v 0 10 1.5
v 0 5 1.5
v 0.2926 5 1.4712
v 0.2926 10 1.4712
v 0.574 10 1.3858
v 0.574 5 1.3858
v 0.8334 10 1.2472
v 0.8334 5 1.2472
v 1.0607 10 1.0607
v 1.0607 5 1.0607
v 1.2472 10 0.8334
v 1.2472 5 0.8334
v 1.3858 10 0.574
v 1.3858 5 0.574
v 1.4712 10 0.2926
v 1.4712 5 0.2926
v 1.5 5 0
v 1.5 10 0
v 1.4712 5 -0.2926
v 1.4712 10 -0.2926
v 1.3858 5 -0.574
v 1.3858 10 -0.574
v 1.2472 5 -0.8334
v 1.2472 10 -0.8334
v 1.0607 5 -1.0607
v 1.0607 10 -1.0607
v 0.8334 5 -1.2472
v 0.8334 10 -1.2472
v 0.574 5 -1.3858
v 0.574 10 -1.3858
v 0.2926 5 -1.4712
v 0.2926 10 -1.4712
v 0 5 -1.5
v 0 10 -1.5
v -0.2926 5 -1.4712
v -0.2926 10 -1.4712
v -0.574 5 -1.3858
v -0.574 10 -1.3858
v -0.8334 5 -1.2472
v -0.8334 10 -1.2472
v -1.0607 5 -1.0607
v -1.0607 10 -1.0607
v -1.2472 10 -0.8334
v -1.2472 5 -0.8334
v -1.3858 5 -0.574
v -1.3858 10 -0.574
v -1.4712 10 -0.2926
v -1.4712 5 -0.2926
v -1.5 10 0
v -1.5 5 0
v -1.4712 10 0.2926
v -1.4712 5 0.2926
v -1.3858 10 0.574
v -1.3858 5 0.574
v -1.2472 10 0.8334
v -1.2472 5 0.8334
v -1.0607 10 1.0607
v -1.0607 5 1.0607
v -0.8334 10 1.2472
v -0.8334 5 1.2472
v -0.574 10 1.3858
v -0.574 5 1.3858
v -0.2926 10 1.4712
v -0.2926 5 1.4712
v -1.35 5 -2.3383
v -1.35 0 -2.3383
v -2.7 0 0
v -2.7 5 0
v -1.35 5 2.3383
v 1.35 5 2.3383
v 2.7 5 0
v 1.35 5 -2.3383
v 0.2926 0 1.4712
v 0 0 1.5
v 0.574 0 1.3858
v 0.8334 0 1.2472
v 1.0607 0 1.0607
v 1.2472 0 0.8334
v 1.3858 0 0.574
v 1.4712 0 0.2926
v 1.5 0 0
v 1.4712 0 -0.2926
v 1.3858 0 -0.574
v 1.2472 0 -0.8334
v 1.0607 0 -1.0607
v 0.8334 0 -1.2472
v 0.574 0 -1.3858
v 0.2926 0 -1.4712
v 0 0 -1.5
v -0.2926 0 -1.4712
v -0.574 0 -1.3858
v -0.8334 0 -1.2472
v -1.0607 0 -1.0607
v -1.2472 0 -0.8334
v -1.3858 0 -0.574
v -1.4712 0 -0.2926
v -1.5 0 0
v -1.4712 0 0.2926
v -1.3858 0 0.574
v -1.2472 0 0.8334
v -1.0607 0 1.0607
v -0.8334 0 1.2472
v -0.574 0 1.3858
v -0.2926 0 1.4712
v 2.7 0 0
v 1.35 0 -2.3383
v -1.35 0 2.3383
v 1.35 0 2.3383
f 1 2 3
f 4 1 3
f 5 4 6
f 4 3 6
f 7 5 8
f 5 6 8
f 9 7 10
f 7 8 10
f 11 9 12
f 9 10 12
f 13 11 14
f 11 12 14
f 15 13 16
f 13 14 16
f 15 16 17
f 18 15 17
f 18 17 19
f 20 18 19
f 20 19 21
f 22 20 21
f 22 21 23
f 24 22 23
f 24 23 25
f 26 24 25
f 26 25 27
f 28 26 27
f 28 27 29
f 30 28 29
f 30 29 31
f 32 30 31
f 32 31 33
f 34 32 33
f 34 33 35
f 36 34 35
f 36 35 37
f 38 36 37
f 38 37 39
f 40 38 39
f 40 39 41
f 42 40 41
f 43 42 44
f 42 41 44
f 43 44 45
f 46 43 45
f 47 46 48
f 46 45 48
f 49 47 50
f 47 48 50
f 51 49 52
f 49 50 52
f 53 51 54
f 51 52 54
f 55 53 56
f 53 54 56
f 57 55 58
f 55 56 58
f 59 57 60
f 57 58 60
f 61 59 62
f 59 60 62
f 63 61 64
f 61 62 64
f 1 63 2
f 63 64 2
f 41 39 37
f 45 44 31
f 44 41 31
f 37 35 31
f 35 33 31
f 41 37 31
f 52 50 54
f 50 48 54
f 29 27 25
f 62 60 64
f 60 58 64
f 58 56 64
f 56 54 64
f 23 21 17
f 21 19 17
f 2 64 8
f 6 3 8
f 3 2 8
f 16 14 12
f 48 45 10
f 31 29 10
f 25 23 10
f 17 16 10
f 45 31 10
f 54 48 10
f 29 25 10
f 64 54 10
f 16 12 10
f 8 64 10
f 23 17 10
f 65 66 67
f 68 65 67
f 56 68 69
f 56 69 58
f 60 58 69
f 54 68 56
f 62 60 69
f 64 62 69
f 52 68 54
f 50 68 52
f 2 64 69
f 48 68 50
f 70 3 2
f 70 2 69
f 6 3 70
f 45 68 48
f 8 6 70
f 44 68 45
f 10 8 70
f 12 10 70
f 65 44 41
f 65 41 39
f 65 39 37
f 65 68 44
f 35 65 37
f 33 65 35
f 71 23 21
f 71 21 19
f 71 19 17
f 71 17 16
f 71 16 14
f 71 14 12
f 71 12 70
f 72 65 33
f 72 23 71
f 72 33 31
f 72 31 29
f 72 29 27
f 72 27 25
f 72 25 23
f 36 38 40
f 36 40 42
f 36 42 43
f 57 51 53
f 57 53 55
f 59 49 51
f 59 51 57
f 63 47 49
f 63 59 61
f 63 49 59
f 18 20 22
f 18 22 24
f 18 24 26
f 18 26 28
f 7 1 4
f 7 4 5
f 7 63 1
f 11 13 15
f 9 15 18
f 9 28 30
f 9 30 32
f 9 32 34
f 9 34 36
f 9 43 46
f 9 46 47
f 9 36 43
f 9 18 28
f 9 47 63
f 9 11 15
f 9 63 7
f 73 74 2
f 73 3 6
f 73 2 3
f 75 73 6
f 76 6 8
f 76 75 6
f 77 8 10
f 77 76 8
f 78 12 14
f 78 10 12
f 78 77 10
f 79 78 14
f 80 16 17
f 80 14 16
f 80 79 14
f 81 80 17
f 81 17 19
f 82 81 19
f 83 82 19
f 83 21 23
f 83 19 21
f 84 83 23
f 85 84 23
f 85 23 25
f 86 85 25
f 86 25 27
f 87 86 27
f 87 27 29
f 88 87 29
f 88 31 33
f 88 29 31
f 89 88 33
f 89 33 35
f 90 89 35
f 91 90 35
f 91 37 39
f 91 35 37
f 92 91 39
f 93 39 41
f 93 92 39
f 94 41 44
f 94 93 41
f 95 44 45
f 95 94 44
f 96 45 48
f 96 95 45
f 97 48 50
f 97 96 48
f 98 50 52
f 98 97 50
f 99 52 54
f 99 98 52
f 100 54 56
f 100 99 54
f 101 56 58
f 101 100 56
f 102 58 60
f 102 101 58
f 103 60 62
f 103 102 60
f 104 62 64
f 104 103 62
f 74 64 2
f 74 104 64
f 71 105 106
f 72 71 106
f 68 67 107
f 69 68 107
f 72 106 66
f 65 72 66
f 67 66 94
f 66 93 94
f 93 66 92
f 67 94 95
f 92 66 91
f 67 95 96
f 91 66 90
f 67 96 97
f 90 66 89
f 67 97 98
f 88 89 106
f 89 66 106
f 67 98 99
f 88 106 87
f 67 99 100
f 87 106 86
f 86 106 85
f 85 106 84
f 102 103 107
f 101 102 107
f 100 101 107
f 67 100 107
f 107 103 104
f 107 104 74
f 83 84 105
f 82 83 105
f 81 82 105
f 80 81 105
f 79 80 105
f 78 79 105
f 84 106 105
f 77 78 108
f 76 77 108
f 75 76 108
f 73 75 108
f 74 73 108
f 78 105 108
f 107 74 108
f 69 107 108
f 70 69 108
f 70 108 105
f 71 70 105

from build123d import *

# Parameters (mm, degrees)
EXTRUDE_1_DEPTH          = 5
SKETCH_2_R               = 1.5
EXTRUDE_2_DEPTH          = 10
CUT_EXTRUDE_2_DEPTH      = 5
CUT_EXTRUDE_2_DEPTH_BACK = 1
SKETCH_3_R               = 1.5


with BuildPart() as part:
    # 草图1 → 凸台-拉伸1 (new body)
    with BuildSketch(Plane(origin=(0, 0, 0), x_dir=(1, 0, 0), z_dir=(0, 1, 0))):
        Polygon((2.7, 0), (1.35, 2.33826859), (-1.35, 2.33826859), (-2.7, 0), (-1.35, -2.33826859), (1.35, -2.33826859), align=None)
    extrude(amount=EXTRUDE_1_DEPTH)

    # 草图2 → 凸台-拉伸2 (add)
    with BuildSketch(Plane(origin=(0, 0, 0), x_dir=(1, 0, 0), z_dir=(0, 1, 0))):
        with Locations(Location((0, 0, 0), (0, 0, 270))):
            Circle(SKETCH_2_R)
    extrude(amount=EXTRUDE_2_DEPTH)

    # 草图3 → 切除-拉伸2 (cut, two sides: drawn at the far end of the back side and taken through both)
    with BuildSketch(Plane(origin=(0, 0, 0), x_dir=(1, 0, 0), z_dir=(0, 1, 0)).offset(-CUT_EXTRUDE_2_DEPTH_BACK)):
        with Locations(Location((0, 0, 0), (0, 0, 270))):
            Circle(SKETCH_3_R)
    extrude(amount=CUT_EXTRUDE_2_DEPTH + CUT_EXTRUDE_2_DEPTH_BACK, mode=Mode.SUBTRACT)


with BuildPart() as cut_extrude_2_piece_1:
    # of the separate pieces the step leaves, piece 1, a body of its own (cut_extrude_2_pieces)
    add(part.part.solids().sort_by_distance((2.7, 0, 0))[0])


with BuildPart() as cut_extrude_2_piece_2:
    # of the separate pieces the step leaves, piece 2, a body of its own (cut_extrude_2_pieces)
    add(part.part.solids().sort_by_distance((0, 10, 1.5))[0])


solid = Compound([cut_extrude_2_piece_1.part, cut_extrude_2_piece_2.part])
